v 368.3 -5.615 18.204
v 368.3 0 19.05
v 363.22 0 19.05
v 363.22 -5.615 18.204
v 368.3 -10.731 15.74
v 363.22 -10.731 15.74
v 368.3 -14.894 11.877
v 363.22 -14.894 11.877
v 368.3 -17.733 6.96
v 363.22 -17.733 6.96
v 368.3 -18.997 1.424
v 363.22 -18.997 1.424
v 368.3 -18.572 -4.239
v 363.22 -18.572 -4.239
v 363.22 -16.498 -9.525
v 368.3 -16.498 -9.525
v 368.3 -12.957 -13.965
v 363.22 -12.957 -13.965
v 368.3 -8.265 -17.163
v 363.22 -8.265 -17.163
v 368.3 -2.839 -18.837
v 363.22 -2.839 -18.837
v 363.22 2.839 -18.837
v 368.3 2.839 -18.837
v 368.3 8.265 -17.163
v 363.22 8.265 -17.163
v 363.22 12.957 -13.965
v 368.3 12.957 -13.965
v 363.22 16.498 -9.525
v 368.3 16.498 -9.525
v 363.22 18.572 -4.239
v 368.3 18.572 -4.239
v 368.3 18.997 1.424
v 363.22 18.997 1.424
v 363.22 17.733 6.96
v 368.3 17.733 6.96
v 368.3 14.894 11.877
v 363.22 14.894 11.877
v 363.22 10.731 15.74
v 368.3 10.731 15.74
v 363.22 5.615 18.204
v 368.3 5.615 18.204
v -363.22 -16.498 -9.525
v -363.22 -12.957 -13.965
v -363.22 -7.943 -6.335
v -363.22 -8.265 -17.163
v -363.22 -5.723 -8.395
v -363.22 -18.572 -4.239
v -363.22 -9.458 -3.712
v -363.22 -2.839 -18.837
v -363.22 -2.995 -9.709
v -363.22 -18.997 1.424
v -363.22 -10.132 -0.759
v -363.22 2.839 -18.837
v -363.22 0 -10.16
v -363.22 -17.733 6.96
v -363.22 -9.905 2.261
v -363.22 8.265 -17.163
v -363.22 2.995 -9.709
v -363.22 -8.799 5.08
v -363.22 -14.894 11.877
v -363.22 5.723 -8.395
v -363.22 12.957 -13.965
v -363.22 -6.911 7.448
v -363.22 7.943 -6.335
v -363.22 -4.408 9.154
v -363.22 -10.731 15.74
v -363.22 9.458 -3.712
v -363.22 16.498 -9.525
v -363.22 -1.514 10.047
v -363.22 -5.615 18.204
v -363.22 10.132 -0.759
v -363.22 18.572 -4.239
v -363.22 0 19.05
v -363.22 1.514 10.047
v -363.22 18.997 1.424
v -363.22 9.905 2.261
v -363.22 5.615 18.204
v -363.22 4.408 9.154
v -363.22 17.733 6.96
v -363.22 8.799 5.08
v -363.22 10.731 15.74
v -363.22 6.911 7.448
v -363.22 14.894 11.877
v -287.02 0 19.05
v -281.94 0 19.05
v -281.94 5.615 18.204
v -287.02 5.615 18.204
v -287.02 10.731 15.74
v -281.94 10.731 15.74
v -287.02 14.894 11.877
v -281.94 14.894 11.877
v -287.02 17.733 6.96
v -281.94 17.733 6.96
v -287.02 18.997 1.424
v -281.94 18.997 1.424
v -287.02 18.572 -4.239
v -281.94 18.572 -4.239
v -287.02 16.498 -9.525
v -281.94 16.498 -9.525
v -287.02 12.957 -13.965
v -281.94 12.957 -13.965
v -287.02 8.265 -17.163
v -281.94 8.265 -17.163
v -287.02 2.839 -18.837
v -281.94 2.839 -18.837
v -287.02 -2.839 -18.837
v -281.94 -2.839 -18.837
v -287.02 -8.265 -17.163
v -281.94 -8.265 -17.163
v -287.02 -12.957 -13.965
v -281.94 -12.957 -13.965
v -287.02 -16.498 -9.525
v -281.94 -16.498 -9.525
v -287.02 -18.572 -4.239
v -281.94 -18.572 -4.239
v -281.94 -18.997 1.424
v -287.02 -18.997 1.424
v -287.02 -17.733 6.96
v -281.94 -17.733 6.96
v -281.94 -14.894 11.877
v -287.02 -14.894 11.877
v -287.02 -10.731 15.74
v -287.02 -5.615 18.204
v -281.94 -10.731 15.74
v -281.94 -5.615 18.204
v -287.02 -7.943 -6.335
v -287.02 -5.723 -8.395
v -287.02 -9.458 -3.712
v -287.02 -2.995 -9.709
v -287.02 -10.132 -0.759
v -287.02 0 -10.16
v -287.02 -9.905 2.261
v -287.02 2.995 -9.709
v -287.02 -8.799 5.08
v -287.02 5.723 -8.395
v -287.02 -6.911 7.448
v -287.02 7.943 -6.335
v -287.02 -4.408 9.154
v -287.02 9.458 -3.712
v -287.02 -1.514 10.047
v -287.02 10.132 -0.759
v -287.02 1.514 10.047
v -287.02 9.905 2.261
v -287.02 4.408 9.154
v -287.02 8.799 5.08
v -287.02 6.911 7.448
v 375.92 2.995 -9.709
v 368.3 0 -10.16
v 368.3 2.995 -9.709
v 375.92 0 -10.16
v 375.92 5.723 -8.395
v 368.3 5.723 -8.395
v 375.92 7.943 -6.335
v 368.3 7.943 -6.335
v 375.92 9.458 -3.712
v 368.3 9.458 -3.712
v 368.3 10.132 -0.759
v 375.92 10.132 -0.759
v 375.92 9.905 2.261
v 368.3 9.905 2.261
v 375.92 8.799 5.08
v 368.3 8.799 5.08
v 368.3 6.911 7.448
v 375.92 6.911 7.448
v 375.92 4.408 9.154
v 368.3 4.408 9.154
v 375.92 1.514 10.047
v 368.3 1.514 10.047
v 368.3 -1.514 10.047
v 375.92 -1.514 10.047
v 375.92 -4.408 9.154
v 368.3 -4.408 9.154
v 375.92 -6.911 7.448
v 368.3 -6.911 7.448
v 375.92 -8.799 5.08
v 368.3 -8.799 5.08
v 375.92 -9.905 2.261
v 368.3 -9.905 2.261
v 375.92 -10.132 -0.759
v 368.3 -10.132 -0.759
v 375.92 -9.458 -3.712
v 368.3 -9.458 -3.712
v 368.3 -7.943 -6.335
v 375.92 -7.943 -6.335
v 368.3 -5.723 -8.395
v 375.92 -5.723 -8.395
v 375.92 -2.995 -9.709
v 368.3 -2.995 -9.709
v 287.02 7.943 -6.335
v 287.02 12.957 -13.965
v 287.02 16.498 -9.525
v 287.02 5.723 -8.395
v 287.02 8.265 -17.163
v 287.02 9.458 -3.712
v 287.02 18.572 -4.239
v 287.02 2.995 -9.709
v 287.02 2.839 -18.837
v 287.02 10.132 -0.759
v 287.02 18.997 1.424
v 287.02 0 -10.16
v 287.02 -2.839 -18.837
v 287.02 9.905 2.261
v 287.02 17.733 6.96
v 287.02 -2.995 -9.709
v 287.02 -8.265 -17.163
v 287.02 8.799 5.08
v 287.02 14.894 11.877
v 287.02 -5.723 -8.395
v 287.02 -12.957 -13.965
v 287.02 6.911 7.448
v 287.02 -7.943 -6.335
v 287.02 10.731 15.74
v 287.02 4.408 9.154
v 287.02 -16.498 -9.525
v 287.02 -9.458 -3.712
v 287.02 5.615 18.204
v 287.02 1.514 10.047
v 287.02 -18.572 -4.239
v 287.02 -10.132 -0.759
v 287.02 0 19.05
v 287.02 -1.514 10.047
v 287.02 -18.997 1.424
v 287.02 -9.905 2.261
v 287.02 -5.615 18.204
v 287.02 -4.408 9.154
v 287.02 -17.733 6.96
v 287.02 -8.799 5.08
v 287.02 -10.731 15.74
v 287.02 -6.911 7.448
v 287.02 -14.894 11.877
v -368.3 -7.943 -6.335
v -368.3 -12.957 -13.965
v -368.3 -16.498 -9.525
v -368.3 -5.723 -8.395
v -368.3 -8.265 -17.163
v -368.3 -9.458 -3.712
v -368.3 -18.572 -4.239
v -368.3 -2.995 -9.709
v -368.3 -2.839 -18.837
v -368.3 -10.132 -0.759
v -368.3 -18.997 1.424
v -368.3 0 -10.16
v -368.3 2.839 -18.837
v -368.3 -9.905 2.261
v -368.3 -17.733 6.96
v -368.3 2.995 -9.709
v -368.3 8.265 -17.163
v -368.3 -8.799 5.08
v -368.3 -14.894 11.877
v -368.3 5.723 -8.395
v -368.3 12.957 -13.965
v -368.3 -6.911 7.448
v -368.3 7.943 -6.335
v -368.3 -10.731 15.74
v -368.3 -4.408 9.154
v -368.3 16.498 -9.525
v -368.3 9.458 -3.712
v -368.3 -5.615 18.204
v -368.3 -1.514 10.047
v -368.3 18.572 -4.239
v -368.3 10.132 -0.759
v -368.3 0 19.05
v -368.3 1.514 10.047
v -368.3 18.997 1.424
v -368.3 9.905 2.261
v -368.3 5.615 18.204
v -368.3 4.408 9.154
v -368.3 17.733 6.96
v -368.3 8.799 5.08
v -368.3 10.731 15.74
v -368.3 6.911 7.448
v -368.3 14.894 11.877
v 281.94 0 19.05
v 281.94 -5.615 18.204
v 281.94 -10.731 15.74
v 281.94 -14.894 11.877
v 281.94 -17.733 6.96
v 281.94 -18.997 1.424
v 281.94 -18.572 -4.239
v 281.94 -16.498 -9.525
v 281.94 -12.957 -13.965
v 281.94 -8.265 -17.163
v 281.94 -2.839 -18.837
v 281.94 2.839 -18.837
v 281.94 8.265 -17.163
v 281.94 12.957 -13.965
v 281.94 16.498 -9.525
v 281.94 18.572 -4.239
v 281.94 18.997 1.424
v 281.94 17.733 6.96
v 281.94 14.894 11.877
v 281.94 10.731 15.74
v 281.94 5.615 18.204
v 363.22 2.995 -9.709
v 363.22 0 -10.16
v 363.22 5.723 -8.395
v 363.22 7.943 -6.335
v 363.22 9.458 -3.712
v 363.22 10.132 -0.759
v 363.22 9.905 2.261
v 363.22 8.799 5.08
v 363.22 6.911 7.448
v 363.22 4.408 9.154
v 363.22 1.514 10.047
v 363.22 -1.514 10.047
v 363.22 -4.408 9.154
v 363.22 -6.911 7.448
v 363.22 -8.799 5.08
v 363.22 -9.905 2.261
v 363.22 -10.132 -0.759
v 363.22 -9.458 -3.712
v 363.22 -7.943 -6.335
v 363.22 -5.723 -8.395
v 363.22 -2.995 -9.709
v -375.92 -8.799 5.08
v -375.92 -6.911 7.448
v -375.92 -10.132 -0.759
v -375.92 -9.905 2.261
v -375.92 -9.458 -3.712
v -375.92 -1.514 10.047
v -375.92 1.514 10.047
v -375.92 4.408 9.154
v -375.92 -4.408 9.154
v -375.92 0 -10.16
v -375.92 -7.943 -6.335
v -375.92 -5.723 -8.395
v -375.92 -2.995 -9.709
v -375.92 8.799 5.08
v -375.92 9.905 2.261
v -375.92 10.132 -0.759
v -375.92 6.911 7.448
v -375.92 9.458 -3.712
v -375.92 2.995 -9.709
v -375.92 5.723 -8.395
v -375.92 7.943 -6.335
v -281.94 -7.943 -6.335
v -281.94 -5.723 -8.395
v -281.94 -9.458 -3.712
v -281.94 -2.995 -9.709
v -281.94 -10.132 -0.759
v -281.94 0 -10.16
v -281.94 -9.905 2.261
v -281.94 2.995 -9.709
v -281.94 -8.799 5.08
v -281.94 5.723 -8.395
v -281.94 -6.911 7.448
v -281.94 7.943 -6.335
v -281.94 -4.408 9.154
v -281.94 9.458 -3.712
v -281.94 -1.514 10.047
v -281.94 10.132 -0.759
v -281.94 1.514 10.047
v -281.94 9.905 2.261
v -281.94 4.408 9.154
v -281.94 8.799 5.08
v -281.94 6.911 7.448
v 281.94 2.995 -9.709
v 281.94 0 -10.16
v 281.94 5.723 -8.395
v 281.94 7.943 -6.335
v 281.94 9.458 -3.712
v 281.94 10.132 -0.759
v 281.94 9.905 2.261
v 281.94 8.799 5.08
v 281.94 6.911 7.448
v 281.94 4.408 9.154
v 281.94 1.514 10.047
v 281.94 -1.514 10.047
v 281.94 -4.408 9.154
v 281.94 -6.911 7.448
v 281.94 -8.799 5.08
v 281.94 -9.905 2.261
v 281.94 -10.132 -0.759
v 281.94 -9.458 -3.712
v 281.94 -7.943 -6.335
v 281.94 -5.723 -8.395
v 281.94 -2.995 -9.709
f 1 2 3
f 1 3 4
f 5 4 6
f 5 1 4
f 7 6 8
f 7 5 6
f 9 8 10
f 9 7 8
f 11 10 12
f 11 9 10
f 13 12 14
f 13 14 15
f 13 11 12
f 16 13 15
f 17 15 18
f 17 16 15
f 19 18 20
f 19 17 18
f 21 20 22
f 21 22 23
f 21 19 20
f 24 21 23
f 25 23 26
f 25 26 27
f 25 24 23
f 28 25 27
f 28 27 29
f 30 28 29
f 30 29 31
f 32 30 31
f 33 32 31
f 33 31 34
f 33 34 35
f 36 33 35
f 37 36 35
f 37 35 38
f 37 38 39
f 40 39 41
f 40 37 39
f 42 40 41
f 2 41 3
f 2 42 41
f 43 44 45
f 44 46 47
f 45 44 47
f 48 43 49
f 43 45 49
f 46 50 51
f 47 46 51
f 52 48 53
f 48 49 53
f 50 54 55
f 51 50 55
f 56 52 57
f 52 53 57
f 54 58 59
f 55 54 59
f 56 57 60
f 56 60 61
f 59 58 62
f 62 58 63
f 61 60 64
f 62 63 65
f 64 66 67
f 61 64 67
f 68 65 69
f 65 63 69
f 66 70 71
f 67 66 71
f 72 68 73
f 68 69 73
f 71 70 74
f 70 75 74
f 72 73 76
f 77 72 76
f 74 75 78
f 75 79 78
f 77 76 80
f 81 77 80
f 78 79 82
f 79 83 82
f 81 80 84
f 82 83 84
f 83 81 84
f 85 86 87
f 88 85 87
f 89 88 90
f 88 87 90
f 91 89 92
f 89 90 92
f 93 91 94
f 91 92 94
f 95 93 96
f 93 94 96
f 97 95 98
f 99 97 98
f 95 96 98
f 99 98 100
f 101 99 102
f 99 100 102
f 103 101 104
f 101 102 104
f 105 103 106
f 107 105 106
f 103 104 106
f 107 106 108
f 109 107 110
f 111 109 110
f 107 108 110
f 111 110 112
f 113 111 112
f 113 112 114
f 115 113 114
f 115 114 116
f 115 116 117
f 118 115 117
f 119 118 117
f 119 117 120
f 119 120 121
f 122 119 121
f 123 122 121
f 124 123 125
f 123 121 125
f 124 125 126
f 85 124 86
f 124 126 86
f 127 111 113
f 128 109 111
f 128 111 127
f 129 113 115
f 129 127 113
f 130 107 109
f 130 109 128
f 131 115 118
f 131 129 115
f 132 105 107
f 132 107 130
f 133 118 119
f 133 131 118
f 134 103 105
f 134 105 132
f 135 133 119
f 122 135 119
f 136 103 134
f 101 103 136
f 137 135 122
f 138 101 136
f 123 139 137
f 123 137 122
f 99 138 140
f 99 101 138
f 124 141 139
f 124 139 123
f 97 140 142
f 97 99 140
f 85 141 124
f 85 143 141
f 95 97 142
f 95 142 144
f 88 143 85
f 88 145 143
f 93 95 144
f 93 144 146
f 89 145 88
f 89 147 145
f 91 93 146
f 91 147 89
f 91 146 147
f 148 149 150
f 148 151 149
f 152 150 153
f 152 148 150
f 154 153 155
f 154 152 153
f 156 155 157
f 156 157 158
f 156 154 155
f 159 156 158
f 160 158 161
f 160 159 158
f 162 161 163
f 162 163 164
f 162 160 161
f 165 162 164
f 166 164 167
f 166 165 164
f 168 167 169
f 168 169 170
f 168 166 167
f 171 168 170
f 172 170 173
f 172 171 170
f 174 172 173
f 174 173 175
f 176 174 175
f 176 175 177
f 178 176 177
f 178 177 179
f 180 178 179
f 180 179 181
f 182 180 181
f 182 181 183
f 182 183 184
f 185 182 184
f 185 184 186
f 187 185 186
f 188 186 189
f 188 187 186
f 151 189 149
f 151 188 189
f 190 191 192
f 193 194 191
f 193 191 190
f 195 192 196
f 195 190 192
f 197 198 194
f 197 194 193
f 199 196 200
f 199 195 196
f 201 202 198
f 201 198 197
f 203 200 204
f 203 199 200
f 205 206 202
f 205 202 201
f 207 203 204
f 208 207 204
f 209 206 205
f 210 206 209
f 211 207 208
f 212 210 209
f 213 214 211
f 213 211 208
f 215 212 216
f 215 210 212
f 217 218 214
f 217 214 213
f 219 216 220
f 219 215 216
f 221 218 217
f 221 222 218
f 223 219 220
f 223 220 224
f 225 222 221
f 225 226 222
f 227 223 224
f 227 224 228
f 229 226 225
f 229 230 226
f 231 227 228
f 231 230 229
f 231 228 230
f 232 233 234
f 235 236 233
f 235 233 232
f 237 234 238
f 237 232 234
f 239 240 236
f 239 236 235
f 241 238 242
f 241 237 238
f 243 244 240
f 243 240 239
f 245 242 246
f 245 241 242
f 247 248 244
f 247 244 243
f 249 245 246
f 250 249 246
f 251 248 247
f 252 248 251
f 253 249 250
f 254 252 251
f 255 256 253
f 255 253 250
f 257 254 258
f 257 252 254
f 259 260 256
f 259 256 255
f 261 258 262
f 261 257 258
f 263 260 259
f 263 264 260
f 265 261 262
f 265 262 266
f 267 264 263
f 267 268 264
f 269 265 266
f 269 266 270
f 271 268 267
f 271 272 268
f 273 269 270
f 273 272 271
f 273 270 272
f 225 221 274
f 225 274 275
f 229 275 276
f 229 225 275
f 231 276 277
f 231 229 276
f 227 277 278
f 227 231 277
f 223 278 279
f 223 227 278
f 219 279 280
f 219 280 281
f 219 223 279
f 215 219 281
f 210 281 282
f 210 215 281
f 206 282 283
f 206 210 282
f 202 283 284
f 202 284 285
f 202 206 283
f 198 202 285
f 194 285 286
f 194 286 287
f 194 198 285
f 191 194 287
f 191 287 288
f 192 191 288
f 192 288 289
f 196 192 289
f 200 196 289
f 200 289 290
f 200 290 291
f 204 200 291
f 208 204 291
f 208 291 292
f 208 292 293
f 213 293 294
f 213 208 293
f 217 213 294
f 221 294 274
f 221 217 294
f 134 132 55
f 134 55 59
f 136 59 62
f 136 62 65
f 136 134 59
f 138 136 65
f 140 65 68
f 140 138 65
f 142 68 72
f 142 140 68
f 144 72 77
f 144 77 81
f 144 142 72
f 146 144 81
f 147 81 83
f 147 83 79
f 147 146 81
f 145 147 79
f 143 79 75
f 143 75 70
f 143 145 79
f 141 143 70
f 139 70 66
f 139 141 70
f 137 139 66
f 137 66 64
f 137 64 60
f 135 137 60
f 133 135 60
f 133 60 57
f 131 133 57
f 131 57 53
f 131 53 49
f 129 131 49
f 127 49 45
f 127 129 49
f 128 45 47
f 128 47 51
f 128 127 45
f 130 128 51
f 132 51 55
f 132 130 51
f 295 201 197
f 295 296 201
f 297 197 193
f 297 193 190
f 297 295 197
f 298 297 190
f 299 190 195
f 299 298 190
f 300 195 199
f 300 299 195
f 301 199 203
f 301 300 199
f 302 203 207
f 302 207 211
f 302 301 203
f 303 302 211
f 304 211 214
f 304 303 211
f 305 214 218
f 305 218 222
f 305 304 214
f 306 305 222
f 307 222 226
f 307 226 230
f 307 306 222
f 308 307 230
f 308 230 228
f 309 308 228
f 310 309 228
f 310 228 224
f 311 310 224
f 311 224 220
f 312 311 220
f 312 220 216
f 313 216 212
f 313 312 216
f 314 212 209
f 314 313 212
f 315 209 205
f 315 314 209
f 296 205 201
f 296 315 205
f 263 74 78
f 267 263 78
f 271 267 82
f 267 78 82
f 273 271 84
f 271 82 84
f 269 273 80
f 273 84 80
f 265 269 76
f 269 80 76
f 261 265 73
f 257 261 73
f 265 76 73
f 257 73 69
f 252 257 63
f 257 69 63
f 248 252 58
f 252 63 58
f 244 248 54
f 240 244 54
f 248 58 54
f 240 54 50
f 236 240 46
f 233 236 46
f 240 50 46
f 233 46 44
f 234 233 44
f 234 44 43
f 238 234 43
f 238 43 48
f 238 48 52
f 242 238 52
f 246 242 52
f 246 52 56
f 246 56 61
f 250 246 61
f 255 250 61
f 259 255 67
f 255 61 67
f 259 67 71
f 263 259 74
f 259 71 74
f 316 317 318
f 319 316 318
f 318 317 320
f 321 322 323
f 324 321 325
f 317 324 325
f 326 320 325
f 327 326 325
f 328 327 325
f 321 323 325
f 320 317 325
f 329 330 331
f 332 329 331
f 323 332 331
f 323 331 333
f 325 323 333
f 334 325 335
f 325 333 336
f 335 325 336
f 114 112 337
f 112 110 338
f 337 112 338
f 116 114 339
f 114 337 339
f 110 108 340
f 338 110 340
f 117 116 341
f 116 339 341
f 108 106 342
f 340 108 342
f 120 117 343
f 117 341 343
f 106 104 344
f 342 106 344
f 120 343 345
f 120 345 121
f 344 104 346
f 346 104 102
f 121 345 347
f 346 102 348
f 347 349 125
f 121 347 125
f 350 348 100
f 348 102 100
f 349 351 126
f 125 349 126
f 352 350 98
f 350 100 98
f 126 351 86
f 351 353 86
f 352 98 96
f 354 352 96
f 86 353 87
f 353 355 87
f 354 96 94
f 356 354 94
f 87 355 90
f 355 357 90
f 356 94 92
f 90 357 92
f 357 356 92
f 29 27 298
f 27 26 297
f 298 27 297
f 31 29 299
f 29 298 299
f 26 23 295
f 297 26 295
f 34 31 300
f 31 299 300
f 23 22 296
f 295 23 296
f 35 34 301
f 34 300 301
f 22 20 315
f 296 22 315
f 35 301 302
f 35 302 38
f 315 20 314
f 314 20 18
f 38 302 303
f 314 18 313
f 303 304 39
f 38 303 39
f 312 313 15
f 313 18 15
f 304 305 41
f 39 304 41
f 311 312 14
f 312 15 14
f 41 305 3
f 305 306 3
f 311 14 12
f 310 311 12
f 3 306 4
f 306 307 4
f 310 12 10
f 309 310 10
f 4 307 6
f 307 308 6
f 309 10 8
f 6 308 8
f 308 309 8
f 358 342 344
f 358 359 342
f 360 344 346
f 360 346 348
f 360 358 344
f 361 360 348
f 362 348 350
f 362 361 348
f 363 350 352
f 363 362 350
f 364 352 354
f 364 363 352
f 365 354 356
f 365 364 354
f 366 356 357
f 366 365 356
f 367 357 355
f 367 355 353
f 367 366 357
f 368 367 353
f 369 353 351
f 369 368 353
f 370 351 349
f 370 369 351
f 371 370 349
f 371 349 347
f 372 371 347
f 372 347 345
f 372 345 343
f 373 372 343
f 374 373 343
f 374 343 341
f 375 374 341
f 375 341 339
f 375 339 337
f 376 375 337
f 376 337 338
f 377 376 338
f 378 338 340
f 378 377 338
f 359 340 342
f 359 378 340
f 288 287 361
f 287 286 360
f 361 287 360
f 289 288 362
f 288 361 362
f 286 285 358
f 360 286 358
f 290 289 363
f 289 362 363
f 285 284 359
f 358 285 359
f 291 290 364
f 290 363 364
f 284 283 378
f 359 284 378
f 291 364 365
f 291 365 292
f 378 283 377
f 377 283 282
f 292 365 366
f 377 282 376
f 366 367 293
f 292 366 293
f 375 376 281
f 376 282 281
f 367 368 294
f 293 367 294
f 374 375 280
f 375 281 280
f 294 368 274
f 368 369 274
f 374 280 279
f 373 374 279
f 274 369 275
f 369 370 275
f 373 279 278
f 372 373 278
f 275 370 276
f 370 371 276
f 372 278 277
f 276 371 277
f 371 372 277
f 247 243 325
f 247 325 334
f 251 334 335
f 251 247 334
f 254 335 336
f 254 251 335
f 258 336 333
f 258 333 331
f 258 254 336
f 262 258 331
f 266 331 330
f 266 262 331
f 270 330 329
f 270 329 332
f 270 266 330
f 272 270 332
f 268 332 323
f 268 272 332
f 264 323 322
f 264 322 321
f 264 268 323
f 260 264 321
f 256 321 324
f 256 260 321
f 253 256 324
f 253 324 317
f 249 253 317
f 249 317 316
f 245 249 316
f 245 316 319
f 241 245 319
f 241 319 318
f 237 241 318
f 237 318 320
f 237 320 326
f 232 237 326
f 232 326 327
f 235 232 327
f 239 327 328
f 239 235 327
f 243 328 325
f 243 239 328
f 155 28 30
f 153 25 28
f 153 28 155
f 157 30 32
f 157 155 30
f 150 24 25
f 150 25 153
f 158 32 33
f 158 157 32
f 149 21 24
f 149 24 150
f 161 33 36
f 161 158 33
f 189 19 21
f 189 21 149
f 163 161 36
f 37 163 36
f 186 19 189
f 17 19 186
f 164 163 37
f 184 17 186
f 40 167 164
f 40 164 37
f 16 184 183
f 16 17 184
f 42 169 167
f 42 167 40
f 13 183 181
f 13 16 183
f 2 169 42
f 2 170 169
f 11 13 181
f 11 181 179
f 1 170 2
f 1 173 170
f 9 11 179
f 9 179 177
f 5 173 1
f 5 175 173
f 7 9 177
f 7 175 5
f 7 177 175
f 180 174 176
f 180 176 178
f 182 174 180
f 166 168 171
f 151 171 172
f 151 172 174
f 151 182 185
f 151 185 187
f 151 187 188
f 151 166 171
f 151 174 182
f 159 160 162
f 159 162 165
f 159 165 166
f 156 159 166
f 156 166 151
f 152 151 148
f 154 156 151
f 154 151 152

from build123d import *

# Parameters (mm, degrees)
SKETCH1_R           = 10.16
BOSS_EXTRUDE1_DEPTH = 375.92
BOSS_EXTRUDE2_START = -12.7
SKETCH2_R           = 19.05
BOSS_EXTRUDE2_DEPTH = 5.08
BOSS_EXTRUDE3_START = -93.98
SKETCH3_R           = 19.05
BOSS_EXTRUDE3_DEPTH = 5.08
BOSS_EXTRUDE4_START = -7.62
SKETCH4_R           = 19.05
BOSS_EXTRUDE4_DEPTH = 5.08
BOSS_EXTRUDE5_START = -88.9
SKETCH5_R           = 19.05
BOSS_EXTRUDE5_DEPTH = 5.08


with BuildPart() as part:
    # Sketch1 → Boss-Extrude1 (new, symmetric)
    with BuildSketch(Plane(origin=(0, 0, 0), x_dir=(0, 0, -1), z_dir=(1, 0, 0))):
        Circle(SKETCH1_R)
    extrude(amount=BOSS_EXTRUDE1_DEPTH, both=True)

    # Sketch2 → Boss-Extrude2 (add)
    with BuildSketch(Plane.ZY.offset(375.92).offset(BOSS_EXTRUDE2_START)):
        Circle(SKETCH2_R)
    extrude(amount=BOSS_EXTRUDE2_DEPTH)

    # Sketch3 → Boss-Extrude3 (add)
    with BuildSketch(Plane.ZY.offset(375.92).offset(BOSS_EXTRUDE3_START)):
        Circle(SKETCH3_R)
    extrude(amount=BOSS_EXTRUDE3_DEPTH)

    # Sketch4 → Boss-Extrude4 (add)
    with BuildSketch(Plane(origin=(375.92, 0, 0), x_dir=(0, 0, -1), z_dir=(1, 0, 0)).offset(BOSS_EXTRUDE4_START)):
        with Locations(Location((0, 0, 0), (0, 0, 180))):
            Circle(SKETCH4_R)
    extrude(amount=-BOSS_EXTRUDE4_DEPTH)

    # Sketch5 → Boss-Extrude5 (add)
    with BuildSketch(Plane(origin=(375.92, 0, 0), x_dir=(0, 0, -1), z_dir=(1, 0, 0)).offset(BOSS_EXTRUDE5_START)):
        with Locations(Location((0, 0, 0), (0, 0, 180))):
            Circle(SKETCH5_R)
    extrude(amount=-BOSS_EXTRUDE5_DEPTH)


solid = part.part
